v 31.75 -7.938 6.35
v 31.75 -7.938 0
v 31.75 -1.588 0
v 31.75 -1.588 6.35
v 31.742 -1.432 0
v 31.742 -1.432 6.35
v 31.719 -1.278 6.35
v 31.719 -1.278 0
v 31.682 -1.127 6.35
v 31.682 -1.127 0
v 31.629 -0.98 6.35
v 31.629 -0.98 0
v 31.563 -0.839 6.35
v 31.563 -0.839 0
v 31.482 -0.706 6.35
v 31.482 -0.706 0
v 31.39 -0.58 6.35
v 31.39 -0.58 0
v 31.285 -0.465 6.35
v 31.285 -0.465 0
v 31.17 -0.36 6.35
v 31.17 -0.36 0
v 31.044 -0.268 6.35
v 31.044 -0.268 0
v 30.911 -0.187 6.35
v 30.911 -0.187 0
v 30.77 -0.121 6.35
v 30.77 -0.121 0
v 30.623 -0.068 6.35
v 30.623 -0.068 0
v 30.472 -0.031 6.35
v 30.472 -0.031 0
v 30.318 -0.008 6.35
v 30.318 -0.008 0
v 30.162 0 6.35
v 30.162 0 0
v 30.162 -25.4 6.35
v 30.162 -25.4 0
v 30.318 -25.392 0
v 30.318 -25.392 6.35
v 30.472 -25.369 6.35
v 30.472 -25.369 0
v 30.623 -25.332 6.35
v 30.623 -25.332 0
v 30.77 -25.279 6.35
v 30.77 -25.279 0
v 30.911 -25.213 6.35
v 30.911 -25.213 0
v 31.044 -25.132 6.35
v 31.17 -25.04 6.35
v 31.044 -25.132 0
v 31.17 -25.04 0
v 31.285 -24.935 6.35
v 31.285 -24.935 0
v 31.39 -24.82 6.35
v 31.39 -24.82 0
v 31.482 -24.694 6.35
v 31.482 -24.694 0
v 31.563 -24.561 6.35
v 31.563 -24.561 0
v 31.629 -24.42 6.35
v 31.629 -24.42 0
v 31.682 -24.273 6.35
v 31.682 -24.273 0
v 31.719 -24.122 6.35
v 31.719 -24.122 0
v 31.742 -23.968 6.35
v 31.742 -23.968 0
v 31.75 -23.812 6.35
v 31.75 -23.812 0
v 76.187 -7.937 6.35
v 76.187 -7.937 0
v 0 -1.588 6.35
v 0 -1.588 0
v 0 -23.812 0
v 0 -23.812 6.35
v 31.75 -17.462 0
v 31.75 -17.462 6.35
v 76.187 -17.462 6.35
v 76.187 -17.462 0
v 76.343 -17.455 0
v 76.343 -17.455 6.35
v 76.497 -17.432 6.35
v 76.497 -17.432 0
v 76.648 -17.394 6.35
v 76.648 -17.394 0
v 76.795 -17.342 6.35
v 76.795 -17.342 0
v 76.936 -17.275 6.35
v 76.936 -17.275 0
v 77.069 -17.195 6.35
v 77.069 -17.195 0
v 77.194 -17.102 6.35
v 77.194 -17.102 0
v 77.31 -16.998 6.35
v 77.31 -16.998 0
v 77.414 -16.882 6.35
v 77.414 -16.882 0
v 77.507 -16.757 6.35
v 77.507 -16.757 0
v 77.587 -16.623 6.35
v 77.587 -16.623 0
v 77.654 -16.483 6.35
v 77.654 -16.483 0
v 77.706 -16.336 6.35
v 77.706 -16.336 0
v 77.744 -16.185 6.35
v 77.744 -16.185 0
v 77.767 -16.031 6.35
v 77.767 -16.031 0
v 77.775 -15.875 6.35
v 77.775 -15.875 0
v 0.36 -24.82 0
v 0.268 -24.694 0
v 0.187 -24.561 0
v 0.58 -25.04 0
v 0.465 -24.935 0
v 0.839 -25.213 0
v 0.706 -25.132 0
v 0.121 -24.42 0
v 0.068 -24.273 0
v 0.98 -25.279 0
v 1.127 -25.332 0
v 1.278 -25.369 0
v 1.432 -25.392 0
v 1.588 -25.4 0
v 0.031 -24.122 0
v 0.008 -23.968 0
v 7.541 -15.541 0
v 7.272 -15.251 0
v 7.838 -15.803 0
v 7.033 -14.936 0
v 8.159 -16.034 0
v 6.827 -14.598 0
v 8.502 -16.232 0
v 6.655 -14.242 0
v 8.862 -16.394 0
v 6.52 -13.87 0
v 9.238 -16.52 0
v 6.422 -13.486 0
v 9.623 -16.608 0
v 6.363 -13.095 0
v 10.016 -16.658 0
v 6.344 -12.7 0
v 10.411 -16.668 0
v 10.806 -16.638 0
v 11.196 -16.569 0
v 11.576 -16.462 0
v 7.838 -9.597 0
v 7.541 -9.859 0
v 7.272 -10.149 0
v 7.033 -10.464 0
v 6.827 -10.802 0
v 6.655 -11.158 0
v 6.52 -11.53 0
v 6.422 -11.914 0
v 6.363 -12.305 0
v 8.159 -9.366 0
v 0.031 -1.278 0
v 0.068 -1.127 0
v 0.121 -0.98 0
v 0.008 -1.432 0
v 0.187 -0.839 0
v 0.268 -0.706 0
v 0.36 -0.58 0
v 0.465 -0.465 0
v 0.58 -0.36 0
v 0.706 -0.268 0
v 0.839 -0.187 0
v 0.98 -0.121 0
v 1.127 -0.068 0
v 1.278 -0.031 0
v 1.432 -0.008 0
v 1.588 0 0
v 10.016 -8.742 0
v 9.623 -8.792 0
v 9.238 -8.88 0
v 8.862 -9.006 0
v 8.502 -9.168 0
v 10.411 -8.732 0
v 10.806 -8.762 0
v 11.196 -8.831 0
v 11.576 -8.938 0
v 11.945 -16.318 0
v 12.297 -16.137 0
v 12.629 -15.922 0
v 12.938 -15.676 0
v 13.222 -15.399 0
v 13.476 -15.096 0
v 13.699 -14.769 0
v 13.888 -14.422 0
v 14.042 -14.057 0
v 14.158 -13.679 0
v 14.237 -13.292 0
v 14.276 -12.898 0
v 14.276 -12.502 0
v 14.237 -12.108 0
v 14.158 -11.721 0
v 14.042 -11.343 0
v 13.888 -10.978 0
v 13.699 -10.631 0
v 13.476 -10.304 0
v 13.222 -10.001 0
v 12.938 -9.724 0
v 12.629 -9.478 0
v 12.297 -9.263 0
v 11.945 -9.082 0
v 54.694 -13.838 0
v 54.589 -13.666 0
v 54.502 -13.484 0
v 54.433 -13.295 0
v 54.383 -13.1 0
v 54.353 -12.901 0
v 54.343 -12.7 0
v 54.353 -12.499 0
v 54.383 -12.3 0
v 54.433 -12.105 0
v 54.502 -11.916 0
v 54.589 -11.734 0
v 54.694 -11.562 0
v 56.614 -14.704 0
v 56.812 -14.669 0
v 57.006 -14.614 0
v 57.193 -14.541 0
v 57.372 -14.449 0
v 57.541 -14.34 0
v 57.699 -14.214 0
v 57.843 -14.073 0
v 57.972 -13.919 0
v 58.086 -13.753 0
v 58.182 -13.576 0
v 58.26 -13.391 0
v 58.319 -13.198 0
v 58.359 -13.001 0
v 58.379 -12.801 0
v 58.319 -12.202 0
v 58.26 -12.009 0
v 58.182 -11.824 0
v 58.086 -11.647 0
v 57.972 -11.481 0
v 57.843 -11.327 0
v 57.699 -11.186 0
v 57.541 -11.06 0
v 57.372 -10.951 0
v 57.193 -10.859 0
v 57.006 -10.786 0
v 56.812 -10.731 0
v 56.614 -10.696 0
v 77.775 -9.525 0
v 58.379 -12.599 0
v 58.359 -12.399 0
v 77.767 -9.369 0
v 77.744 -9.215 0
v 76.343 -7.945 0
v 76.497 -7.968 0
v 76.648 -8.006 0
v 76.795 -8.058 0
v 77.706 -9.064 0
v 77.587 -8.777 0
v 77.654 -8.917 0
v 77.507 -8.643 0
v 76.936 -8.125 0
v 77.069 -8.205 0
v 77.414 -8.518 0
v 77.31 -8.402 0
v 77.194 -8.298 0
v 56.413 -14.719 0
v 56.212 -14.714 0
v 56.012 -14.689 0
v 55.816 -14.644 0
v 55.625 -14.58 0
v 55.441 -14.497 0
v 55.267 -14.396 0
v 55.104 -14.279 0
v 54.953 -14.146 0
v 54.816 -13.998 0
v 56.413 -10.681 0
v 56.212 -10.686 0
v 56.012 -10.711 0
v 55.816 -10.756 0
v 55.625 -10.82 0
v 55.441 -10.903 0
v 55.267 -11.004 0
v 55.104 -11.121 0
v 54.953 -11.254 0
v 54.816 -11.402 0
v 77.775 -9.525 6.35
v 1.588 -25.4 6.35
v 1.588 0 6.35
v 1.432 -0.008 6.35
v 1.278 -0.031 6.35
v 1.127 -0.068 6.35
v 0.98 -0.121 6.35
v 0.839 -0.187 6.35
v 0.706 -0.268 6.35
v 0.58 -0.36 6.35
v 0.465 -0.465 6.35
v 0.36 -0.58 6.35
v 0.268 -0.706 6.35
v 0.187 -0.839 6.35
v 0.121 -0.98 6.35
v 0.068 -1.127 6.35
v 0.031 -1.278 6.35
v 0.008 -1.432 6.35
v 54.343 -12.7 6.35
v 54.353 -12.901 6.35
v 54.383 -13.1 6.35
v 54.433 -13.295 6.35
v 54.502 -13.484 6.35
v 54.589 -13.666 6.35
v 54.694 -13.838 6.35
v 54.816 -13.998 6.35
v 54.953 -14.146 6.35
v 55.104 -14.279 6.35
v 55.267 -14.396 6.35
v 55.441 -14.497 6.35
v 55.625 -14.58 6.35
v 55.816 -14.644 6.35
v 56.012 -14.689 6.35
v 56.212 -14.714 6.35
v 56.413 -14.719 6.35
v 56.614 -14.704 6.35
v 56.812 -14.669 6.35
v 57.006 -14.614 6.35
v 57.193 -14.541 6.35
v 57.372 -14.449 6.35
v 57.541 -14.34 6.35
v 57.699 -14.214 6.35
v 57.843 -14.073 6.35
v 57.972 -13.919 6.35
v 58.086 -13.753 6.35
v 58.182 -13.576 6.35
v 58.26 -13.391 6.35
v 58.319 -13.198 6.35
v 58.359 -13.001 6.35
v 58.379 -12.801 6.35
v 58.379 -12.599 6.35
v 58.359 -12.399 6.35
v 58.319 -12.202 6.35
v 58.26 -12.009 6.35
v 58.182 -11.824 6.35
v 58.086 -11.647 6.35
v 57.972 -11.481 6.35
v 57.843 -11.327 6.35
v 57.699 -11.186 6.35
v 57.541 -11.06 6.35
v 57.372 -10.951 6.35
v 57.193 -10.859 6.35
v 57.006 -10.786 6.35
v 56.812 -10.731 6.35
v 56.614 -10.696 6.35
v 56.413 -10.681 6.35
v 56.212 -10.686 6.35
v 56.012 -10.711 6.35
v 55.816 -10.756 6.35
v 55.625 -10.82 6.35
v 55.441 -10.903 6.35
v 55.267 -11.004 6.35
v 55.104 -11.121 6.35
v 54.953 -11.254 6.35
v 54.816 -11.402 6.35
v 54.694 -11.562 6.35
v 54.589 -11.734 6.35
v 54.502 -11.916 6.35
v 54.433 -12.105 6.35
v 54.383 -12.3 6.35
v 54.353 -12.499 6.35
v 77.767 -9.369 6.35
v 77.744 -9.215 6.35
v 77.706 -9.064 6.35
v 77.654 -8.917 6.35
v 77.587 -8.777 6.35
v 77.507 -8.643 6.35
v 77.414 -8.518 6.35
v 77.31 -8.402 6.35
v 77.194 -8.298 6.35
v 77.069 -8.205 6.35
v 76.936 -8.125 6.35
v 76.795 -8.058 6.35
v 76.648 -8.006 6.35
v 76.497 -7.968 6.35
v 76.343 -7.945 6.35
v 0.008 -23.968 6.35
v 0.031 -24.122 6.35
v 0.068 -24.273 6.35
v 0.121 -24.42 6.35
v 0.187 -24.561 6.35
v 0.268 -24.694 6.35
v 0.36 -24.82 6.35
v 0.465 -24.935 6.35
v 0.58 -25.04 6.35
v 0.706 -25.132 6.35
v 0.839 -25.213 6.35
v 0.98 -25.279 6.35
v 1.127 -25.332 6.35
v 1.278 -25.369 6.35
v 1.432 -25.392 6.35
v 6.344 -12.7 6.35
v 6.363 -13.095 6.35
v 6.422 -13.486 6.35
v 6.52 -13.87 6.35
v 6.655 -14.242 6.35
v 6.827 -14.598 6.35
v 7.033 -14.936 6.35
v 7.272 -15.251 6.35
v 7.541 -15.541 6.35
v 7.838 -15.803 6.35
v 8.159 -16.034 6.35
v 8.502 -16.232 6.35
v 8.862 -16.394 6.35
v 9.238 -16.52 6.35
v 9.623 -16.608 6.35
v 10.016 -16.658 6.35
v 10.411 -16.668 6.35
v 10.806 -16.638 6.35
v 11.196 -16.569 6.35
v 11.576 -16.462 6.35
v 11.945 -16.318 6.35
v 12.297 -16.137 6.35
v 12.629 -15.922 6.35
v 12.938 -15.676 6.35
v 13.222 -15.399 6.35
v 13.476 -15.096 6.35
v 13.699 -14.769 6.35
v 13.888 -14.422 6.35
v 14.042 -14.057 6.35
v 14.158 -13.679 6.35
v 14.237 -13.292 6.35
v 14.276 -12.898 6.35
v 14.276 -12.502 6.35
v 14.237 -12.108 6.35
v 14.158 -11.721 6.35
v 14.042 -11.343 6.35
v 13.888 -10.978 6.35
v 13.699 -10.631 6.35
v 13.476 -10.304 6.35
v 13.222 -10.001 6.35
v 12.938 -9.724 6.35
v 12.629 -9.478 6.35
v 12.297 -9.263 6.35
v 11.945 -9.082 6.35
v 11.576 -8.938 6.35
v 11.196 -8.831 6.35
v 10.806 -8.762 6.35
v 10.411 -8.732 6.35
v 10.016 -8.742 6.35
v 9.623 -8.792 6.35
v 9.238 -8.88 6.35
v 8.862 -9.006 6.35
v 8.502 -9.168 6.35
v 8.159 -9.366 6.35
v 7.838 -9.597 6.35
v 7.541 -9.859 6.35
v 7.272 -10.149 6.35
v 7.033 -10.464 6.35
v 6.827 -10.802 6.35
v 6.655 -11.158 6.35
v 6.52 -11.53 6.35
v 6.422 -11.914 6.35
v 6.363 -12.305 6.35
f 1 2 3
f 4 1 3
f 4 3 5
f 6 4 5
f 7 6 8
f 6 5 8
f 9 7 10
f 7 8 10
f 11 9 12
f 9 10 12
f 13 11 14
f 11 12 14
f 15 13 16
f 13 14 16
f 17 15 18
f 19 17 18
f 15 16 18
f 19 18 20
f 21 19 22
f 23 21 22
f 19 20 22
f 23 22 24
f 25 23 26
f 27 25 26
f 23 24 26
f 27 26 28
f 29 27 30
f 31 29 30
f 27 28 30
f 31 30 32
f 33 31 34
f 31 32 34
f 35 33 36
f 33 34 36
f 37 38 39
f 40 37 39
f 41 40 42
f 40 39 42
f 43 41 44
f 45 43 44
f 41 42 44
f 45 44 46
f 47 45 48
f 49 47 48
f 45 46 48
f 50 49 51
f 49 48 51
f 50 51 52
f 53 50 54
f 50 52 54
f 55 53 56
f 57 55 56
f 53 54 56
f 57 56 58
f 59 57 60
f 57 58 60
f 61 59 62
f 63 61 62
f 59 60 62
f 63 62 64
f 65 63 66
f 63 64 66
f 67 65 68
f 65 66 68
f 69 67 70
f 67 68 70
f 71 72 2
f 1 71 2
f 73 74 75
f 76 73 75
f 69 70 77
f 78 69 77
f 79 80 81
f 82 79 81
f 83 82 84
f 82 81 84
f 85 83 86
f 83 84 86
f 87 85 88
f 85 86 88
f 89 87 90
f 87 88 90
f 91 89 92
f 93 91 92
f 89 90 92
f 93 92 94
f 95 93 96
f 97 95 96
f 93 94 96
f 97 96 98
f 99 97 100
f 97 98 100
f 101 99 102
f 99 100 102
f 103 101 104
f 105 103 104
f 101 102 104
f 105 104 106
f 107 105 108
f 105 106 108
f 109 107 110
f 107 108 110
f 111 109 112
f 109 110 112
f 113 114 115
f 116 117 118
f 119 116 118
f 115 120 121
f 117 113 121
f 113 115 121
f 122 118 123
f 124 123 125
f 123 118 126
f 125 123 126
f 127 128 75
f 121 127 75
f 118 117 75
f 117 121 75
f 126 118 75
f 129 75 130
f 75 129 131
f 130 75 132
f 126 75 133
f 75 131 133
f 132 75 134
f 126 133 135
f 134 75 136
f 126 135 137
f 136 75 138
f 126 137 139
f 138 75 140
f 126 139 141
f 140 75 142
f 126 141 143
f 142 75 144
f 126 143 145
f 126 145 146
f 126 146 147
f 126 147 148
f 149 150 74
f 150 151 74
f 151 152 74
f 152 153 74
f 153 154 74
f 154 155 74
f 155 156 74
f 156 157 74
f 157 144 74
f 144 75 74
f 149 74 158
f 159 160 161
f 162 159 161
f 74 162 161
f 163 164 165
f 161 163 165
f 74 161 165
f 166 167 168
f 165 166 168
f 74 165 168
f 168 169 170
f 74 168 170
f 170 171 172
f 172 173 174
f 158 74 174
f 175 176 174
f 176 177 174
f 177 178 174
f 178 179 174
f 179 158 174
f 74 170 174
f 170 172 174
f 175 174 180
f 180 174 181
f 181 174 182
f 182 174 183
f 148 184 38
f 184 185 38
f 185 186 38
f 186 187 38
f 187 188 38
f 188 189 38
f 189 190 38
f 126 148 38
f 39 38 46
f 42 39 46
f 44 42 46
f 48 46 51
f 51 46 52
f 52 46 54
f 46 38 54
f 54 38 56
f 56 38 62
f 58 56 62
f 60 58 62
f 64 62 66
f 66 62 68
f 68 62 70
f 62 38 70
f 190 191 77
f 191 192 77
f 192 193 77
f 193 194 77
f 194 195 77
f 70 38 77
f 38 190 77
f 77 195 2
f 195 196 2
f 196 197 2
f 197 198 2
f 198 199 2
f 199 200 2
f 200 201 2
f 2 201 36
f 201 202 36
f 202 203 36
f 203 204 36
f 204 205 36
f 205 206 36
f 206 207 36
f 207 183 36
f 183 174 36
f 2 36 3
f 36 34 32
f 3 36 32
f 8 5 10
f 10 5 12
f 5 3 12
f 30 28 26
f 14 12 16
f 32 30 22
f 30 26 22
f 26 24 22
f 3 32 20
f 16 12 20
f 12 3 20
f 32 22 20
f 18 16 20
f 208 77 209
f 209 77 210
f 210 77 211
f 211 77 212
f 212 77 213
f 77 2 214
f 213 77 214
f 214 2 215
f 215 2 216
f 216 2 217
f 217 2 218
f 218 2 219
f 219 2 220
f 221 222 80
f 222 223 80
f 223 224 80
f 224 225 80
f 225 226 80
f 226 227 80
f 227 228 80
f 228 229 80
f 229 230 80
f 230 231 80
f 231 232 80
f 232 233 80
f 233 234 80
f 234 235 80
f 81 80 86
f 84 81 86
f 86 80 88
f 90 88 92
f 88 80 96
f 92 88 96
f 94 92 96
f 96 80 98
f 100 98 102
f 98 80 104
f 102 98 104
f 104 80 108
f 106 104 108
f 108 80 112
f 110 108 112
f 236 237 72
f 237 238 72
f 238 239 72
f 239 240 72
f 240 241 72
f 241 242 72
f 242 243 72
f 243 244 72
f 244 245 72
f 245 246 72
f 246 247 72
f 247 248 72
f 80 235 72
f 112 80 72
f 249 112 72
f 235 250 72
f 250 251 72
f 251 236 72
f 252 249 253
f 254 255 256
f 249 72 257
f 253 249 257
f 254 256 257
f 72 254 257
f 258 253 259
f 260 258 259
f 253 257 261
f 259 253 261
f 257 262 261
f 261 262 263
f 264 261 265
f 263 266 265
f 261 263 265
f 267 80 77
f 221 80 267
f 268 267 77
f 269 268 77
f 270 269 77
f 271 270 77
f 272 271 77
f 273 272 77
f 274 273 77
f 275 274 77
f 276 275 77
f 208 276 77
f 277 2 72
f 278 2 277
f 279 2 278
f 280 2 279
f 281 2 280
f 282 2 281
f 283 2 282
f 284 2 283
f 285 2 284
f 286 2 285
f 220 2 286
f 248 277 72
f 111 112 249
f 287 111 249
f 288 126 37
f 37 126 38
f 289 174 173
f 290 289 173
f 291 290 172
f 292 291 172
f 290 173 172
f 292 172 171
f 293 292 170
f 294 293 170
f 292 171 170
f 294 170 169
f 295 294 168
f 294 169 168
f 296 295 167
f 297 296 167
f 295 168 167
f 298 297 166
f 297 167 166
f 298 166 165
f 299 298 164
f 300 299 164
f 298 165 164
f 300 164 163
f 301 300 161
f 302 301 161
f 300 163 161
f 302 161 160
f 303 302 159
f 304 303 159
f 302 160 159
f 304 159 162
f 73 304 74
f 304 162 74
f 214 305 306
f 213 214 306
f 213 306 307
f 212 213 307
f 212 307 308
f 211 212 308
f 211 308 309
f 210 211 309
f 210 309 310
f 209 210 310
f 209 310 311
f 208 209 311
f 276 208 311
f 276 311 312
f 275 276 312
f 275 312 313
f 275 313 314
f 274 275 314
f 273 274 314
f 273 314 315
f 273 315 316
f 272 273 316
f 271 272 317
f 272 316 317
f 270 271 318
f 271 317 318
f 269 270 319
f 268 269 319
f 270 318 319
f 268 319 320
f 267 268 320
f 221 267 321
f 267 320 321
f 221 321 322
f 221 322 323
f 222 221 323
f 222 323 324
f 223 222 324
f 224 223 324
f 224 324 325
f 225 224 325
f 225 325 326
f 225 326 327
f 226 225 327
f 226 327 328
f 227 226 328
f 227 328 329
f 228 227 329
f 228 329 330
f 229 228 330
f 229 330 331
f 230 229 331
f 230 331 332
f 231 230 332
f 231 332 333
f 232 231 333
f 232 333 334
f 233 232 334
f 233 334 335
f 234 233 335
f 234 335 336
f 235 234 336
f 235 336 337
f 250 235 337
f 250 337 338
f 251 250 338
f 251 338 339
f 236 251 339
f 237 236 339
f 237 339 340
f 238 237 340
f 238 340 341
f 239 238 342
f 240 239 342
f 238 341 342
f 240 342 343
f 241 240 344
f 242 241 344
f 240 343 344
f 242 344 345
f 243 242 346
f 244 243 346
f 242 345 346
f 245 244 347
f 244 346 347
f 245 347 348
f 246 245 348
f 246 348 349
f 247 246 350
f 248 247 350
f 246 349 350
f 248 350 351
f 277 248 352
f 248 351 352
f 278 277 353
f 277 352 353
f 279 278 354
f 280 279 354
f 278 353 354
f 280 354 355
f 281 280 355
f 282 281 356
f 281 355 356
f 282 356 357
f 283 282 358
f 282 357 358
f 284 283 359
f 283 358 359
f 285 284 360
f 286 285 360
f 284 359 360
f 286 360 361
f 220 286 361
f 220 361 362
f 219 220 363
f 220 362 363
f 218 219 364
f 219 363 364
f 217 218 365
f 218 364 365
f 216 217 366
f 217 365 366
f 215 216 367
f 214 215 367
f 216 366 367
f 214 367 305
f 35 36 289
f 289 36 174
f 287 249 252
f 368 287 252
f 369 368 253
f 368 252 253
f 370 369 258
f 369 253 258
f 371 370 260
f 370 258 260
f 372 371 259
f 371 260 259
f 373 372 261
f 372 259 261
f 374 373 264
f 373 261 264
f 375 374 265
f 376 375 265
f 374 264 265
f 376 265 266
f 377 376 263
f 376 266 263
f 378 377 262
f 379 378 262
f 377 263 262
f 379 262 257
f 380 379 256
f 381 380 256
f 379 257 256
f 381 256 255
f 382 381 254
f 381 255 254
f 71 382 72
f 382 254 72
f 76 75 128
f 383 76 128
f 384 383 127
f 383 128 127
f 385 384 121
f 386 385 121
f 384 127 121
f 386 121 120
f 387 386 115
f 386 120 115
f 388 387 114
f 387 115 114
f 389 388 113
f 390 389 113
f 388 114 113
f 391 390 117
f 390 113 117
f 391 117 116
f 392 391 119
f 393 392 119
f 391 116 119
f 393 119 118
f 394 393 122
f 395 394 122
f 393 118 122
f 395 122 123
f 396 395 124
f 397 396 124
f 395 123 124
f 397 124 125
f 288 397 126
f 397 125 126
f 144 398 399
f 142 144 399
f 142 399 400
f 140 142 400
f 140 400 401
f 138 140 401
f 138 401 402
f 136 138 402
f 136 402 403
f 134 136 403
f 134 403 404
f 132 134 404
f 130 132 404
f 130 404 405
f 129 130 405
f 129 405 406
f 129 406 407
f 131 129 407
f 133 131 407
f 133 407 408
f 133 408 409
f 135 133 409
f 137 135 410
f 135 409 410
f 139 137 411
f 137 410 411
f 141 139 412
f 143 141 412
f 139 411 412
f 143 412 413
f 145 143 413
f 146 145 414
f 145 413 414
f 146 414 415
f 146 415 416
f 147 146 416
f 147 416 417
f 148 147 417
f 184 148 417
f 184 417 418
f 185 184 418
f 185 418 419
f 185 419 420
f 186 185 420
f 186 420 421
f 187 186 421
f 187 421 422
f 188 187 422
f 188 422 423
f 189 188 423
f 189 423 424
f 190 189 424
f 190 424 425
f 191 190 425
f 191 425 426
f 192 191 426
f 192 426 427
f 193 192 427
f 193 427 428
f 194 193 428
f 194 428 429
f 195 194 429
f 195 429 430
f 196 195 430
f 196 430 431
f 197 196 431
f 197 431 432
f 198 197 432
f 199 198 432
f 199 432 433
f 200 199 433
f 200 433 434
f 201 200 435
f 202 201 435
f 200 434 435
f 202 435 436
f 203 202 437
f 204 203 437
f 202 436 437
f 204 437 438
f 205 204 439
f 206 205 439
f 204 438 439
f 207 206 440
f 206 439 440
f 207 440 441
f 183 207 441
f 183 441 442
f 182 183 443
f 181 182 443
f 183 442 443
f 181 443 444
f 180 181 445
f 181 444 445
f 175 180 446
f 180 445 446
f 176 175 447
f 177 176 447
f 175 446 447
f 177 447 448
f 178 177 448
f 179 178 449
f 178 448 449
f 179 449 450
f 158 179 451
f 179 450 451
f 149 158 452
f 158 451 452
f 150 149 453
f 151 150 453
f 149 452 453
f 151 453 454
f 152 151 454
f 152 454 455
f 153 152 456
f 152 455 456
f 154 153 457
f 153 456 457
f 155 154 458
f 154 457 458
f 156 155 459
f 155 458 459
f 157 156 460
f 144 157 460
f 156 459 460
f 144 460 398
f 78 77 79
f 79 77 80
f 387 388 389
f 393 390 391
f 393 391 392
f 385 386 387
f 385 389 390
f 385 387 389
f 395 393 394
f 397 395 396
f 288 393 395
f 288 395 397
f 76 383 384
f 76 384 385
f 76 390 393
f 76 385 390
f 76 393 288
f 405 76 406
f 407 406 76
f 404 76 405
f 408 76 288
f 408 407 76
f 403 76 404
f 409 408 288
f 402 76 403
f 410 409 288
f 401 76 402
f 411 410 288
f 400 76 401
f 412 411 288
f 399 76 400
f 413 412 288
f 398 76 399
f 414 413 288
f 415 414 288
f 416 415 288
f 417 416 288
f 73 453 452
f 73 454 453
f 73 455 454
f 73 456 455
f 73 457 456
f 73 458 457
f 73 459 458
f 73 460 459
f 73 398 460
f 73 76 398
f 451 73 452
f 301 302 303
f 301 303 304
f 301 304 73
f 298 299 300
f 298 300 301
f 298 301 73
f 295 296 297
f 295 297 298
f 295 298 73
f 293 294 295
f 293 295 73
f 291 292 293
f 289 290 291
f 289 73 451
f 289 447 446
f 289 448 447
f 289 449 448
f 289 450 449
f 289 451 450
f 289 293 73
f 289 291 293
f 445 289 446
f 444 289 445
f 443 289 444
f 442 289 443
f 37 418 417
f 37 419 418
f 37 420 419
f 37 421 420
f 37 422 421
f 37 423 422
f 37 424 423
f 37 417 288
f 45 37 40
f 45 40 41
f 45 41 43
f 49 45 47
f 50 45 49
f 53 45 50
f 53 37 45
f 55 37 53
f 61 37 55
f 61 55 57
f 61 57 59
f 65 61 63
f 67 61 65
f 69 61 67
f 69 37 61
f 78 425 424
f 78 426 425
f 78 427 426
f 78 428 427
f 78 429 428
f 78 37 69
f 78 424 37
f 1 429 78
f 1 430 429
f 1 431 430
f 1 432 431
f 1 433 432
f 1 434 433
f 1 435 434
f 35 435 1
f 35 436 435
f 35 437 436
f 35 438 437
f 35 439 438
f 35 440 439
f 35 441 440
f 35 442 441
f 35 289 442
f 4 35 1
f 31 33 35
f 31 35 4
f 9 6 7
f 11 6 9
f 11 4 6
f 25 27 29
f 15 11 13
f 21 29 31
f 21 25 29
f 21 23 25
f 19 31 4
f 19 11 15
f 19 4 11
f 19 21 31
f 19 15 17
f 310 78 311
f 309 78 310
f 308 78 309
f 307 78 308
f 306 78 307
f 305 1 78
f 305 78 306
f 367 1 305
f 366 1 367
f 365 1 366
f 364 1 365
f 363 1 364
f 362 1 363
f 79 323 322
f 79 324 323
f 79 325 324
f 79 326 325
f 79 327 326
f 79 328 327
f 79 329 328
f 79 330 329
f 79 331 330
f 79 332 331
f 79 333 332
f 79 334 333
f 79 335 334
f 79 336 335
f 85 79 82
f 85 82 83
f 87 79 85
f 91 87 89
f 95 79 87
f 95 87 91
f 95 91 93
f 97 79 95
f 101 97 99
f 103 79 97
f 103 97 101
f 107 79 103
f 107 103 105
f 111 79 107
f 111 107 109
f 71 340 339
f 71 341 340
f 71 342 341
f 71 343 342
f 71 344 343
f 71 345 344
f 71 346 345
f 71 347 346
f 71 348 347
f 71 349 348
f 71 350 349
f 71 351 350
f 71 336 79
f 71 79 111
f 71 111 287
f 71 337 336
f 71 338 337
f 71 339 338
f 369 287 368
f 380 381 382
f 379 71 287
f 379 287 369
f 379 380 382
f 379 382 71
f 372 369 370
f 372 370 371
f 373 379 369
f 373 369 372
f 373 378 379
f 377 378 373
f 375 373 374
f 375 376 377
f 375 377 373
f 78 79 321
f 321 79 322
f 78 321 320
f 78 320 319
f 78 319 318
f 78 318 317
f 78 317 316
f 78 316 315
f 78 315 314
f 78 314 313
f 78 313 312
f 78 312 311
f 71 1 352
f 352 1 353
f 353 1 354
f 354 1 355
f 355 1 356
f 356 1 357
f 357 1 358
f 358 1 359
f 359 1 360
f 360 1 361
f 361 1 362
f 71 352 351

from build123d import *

# Parameters (mm, degrees)
F1_DEPTH = 6.35
F2_D     = 7.9375
F3_D     = 4.0386


with BuildPart() as f1:
    # F0 (on Top) → F1 (new body)
    with BuildSketch(Plane.XY):
        with BuildLine():
            Line((30.1625, 0), (1.5875, 0))
            ThreePointArc((1.5875, 0), (0.4649679849, -0.4649679849), (0, -1.5875))
            Line((0, -1.5875), (0, -23.8125))
            ThreePointArc((0, -23.8125), (0.4649679849, -24.9350320151), (1.5875, -25.4))
            Line((1.5875, -25.4), (30.1625, -25.4))
            ThreePointArc((30.1625, -25.4), (31.2850320151, -24.9350320151), (31.75, -23.8125))
            Line((31.75, -23.8125), (31.75, -17.4625))
            Line((31.75, -17.4625), (76.1873, -17.4625))
            ThreePointArc((76.1873, -17.4625), (77.3098320151, -16.9975320151), (77.7748, -15.875))
            Line((77.7748, -15.875), (77.7748, -9.525))
            ThreePointArc((77.7748, -9.525), (77.3098320151, -8.4024679849), (76.1873, -7.9375))
            Line((76.1873, -7.9375), (31.75, -7.9375))
            Line((31.75, -7.9375), (31.75, -1.5875))
            ThreePointArc((31.75, -1.5875), (31.2850320151, -0.4649679849), (30.1625, 0))
        make_face()
    extrude(amount=F1_DEPTH)

    # F2 (through all)
    with Locations(Plane(origin=(0, 0, 0), x_dir=(1, 0, 0), z_dir=(0, 0, -1))):
        with Locations((10.3124, 12.7)):
            Hole(F2_D / 2)

    # F3 (through all)
    with Locations(Plane(origin=(0, 0, 0), x_dir=(1, 0, 0), z_dir=(0, 0, -1))):
        with Locations((56.3626, 12.7)):
            Hole(F3_D / 2)


solid = f1.part
